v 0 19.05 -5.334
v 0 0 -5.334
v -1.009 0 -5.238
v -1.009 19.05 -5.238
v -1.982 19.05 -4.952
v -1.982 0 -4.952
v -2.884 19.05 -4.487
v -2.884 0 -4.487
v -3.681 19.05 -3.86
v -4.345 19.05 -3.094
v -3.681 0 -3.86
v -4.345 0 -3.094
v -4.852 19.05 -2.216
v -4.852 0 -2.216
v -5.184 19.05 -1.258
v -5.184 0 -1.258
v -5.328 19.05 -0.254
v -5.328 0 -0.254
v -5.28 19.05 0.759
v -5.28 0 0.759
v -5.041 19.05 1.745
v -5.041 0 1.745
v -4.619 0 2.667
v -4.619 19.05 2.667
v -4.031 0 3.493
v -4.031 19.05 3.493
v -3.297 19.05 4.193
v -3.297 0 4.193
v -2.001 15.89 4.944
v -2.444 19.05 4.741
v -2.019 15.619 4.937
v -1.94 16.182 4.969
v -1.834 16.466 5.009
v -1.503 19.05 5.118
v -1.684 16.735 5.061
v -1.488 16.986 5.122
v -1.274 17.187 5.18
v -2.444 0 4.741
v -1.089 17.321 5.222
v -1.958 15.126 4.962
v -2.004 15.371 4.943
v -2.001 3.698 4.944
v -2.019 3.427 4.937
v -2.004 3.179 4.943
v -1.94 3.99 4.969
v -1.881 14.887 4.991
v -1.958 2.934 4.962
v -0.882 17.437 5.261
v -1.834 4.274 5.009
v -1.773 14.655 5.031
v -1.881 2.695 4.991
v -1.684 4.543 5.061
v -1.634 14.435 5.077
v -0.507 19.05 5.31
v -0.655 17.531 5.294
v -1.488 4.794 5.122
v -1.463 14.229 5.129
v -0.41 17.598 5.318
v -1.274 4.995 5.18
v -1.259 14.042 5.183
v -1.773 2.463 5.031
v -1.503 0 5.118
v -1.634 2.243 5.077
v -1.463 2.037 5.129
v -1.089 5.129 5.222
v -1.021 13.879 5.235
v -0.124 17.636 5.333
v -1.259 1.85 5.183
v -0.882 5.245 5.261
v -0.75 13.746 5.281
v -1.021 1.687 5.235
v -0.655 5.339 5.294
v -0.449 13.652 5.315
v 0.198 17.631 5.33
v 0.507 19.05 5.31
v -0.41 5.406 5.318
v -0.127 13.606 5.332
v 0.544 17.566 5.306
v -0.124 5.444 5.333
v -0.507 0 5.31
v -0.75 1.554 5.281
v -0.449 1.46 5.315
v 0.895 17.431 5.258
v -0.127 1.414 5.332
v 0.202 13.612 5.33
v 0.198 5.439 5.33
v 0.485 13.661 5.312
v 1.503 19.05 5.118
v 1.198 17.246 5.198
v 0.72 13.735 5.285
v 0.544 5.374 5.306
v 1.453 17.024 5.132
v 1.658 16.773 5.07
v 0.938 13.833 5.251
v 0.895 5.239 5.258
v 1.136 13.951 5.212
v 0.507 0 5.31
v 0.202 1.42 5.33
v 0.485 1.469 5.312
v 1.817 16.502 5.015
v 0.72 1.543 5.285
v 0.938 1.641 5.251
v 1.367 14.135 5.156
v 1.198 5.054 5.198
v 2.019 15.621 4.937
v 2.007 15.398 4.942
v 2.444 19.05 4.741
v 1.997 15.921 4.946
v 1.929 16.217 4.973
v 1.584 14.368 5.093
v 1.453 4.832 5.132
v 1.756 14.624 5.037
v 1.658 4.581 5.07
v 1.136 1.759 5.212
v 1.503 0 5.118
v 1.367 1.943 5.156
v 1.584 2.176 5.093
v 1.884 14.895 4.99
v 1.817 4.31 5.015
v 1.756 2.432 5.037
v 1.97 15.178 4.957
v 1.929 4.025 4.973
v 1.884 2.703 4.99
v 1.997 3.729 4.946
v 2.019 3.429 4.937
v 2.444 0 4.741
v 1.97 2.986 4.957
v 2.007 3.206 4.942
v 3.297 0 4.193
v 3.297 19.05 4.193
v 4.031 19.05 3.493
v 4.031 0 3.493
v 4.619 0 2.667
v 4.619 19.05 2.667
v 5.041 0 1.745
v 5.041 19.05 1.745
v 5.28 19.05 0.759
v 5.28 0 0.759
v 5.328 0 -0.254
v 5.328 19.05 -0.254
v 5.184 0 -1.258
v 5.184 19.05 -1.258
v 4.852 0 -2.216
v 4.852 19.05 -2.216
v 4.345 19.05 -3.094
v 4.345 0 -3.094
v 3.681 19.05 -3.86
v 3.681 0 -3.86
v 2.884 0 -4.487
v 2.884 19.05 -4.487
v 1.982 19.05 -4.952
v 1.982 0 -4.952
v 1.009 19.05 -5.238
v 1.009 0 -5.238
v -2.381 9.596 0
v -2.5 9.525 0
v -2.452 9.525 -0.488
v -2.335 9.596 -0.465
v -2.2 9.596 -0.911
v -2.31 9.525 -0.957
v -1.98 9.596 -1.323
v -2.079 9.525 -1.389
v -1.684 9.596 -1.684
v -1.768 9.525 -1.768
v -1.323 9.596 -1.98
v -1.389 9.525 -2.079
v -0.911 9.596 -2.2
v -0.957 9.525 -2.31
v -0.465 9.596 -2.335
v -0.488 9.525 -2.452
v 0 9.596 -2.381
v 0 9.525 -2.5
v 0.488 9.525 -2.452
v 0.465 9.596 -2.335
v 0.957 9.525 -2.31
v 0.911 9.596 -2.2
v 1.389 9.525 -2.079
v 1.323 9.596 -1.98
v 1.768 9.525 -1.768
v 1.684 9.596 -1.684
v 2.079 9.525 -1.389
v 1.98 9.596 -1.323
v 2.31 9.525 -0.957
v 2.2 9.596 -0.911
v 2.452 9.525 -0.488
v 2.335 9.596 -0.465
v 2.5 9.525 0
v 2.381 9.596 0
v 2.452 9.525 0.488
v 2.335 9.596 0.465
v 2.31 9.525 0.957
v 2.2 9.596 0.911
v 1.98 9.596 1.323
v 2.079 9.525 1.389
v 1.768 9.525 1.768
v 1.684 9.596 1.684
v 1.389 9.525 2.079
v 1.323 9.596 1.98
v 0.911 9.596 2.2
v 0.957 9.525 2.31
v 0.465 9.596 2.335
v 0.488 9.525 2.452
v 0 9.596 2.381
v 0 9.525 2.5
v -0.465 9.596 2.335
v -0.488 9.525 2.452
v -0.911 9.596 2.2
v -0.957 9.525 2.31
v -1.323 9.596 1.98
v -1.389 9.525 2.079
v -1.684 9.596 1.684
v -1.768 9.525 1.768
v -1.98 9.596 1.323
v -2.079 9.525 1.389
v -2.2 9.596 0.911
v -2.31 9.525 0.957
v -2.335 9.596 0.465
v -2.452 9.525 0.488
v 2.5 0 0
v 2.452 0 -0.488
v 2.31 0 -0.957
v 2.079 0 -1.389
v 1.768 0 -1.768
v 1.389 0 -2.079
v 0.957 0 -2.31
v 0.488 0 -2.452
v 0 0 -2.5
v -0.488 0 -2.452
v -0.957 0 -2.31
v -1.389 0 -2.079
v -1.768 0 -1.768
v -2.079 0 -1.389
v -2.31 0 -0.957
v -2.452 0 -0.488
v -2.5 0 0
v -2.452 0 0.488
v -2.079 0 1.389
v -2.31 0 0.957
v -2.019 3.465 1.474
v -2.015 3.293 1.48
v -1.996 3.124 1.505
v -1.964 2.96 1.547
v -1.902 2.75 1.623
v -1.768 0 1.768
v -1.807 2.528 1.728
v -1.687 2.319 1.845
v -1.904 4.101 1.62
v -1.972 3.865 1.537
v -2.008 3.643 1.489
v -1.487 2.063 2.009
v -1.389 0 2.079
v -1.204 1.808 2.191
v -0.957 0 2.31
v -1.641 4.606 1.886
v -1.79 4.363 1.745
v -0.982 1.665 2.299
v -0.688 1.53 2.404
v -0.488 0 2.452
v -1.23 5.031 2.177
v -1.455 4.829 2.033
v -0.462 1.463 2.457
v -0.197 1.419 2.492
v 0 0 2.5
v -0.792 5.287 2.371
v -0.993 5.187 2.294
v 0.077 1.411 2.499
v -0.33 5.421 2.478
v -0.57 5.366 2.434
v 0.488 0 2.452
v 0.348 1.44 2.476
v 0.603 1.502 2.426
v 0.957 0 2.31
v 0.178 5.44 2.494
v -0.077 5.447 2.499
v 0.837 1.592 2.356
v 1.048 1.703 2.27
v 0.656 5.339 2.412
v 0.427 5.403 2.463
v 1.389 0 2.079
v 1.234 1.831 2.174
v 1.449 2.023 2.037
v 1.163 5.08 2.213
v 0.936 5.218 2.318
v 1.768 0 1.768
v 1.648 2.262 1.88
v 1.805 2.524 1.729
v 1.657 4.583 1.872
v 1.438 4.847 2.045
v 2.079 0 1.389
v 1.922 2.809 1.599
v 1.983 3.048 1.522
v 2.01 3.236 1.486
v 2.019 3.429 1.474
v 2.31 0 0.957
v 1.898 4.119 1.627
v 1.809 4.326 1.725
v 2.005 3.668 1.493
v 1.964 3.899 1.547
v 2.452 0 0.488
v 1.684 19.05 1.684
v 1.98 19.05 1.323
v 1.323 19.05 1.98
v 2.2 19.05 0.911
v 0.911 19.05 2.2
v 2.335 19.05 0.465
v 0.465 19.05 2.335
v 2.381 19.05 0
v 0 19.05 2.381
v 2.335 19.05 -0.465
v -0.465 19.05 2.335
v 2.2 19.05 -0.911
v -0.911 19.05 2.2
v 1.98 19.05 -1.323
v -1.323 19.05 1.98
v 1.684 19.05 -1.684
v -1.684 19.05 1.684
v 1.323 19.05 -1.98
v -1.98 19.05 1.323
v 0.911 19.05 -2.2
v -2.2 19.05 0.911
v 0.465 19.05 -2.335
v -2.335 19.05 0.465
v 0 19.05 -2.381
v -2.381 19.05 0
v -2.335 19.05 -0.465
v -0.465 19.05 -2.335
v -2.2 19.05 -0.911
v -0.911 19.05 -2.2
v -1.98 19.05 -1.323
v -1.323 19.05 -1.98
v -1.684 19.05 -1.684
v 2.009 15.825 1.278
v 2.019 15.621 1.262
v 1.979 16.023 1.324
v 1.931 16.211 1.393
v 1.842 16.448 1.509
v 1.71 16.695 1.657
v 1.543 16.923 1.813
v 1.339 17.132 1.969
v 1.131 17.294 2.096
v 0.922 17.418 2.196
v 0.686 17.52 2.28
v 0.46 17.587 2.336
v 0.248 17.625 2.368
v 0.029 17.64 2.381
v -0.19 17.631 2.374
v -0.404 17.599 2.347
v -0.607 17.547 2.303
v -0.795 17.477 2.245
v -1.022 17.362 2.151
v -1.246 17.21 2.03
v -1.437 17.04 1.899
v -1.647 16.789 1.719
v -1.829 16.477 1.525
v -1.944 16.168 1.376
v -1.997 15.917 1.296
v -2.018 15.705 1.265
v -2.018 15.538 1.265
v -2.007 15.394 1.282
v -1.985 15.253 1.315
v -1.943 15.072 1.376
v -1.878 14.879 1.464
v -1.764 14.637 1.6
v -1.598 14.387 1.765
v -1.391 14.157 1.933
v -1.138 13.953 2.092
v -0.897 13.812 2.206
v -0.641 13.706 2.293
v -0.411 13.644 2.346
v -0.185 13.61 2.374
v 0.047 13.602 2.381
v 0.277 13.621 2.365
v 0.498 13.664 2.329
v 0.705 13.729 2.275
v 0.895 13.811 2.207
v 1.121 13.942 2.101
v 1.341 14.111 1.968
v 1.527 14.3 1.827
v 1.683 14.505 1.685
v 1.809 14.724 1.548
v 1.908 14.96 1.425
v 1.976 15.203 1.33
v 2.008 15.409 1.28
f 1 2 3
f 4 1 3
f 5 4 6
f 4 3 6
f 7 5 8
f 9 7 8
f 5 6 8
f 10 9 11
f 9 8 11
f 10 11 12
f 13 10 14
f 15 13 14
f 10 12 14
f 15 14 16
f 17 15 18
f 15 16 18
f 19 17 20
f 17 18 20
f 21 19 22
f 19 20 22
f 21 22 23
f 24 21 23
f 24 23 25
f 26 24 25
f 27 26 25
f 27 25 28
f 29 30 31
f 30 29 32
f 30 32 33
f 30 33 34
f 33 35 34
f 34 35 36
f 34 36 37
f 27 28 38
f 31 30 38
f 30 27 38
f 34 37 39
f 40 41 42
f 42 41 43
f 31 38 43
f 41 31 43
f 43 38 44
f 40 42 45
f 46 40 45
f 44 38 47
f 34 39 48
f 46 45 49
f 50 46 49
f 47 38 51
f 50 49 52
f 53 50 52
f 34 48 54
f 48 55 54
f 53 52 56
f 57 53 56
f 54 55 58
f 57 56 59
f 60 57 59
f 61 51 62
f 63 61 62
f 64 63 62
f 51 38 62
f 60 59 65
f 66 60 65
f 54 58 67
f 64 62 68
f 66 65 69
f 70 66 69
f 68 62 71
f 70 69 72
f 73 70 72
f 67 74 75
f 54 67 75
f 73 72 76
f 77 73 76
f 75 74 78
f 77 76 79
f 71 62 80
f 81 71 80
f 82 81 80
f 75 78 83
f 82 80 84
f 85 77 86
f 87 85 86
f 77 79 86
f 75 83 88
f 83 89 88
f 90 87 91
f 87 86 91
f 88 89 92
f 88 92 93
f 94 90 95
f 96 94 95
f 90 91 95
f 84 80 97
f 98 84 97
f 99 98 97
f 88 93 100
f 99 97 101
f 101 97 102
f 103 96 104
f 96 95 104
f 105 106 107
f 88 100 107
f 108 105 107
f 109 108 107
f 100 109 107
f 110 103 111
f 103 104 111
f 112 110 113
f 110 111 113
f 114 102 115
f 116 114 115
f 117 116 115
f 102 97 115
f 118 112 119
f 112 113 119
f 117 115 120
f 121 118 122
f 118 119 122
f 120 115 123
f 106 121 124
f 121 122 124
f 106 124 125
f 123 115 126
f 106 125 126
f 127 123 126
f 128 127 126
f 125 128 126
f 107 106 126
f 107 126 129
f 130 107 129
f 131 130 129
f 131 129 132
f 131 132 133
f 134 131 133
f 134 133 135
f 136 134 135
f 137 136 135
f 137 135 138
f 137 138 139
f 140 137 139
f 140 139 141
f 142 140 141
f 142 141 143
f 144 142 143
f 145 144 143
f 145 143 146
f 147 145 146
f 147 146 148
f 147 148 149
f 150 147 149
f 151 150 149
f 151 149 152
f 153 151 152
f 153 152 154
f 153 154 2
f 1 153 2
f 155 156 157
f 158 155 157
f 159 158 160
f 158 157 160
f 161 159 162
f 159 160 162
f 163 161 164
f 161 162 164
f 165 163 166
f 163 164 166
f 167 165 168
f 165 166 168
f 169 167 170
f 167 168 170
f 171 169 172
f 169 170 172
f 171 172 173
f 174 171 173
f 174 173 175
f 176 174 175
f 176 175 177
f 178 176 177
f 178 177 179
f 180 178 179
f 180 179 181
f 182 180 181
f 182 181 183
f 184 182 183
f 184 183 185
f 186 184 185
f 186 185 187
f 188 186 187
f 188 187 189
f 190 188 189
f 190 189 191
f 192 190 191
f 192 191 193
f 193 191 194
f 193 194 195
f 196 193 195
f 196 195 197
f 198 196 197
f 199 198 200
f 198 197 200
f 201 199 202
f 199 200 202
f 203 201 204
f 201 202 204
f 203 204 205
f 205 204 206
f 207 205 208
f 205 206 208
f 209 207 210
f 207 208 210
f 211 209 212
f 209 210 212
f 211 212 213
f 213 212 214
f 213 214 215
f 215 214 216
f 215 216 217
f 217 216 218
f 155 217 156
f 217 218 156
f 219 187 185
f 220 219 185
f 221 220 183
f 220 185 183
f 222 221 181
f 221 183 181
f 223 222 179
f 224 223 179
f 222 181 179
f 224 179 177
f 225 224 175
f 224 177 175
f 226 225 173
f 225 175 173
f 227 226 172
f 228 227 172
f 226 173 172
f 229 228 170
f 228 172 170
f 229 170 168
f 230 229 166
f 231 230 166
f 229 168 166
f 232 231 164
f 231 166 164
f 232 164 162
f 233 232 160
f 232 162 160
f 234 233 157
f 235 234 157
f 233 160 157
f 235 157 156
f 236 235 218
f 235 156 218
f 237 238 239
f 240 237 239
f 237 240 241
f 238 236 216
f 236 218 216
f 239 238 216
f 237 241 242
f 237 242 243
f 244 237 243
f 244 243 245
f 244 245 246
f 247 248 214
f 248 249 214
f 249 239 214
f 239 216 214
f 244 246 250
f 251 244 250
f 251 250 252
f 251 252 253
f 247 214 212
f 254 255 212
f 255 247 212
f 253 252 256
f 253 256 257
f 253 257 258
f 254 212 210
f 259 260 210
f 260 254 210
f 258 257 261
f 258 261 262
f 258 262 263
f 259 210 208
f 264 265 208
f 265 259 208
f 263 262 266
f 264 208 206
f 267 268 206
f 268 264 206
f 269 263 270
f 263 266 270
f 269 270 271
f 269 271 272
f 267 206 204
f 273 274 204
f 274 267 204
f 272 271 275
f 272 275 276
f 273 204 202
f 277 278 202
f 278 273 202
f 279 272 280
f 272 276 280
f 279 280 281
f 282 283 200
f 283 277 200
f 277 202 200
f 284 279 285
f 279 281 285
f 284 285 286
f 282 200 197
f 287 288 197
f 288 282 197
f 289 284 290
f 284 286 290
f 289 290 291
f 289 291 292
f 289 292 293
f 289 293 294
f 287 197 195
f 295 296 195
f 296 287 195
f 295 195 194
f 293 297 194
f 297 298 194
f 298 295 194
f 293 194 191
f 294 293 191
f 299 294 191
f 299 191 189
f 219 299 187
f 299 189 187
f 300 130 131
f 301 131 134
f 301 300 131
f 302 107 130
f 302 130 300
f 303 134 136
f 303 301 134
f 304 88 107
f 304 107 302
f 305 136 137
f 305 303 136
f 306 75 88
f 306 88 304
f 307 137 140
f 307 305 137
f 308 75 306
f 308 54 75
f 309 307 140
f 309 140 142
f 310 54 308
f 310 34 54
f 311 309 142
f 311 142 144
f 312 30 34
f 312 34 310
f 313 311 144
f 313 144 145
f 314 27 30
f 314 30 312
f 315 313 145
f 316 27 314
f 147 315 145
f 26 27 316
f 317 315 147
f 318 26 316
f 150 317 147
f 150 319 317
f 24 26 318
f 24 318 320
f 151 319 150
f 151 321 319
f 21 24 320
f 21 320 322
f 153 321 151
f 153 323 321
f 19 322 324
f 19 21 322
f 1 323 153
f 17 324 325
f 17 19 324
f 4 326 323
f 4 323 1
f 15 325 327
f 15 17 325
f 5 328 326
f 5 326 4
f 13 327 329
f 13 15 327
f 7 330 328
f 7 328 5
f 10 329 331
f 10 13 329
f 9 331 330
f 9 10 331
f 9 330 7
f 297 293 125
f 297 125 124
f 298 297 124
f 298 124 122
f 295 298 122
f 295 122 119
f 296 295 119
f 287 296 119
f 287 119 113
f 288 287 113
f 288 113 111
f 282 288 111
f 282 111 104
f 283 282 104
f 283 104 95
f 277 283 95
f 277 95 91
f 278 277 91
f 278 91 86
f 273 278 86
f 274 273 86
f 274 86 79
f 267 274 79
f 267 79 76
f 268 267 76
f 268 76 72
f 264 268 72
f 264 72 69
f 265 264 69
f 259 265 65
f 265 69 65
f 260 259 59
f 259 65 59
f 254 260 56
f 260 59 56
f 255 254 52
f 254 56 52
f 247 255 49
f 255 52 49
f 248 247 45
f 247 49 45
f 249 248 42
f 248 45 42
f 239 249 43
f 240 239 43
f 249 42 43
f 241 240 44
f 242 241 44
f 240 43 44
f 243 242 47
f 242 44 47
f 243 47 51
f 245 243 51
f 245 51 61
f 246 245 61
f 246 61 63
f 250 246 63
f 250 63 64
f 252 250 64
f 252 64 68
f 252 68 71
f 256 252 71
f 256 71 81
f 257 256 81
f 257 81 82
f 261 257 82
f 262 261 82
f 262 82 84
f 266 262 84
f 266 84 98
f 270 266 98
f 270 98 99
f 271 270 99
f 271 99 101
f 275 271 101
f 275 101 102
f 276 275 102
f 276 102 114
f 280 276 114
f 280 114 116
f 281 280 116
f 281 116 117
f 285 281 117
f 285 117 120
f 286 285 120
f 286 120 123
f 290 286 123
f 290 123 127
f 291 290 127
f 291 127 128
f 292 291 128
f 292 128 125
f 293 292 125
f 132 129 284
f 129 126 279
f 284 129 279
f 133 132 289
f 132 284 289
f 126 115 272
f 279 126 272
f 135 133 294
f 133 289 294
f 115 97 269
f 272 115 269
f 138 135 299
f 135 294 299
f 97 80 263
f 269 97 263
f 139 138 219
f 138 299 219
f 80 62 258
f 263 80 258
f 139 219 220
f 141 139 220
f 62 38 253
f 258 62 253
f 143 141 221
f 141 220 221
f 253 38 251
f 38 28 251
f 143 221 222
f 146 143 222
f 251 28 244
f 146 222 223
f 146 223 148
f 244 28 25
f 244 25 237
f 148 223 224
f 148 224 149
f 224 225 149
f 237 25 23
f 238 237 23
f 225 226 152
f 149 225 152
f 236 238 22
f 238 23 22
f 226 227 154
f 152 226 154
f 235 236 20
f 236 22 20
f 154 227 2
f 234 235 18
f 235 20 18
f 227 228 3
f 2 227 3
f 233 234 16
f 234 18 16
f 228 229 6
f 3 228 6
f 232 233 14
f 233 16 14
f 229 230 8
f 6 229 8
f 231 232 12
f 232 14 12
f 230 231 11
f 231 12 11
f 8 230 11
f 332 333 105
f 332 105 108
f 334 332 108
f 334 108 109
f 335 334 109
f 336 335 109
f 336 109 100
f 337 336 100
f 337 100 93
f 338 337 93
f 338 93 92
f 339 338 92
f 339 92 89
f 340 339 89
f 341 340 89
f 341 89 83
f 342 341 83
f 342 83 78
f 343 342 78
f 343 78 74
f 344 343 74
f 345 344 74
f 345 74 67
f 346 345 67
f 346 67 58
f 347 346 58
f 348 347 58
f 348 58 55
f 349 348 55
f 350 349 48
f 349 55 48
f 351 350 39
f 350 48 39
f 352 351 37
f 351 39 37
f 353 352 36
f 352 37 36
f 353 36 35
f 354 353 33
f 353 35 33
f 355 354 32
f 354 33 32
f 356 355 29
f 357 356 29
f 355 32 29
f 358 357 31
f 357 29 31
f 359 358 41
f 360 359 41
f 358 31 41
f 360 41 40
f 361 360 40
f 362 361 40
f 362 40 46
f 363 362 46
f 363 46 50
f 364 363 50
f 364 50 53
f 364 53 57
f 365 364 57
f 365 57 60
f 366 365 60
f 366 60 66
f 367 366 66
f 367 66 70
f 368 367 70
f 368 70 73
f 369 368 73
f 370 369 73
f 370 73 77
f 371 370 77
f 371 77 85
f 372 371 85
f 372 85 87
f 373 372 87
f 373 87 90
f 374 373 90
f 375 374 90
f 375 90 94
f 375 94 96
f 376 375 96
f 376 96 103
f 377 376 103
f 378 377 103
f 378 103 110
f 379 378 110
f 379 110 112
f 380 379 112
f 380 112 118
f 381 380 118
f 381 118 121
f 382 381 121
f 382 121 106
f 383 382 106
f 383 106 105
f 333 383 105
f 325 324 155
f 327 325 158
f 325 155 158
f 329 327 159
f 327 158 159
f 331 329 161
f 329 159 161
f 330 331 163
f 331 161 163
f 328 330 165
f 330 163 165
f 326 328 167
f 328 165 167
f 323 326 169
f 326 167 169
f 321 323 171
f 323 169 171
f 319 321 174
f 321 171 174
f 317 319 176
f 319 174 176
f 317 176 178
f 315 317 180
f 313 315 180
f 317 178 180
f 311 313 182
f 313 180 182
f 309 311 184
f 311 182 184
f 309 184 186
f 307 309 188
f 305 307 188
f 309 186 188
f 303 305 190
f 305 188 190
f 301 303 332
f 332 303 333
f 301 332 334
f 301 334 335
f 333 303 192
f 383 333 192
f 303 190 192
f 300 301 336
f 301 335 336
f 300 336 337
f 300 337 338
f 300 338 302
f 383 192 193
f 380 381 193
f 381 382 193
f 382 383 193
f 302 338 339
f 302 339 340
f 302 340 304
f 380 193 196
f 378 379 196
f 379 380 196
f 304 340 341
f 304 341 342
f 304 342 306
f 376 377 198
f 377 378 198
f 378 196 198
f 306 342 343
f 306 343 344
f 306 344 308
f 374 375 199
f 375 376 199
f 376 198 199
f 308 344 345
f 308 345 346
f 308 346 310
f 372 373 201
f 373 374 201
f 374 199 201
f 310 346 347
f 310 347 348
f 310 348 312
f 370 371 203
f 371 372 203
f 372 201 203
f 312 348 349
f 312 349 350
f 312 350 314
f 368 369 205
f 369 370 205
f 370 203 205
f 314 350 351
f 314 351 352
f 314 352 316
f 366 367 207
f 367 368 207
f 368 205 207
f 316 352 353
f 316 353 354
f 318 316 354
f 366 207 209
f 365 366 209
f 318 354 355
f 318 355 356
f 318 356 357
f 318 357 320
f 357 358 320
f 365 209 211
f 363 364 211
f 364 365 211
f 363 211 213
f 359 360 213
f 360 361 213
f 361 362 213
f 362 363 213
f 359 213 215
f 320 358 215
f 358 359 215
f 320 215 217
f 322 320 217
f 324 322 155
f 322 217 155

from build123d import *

# Parameters (mm, degrees)
SKETCH1_R                       = 5.334
BOSS_EXTRUDE1_DEPTH             = 19.05
F_3_16_0_1875_DOWEL_HOLE2_D     = 4.7625
F_3_16_0_1875_DOWEL_HOLE2_DEPTH = 9.525
F_3_16_0_1875_DOWEL_HOLE2_TIP   = 1.430799349
F_5_0MM_DOWEL_HOLE2_D           = 5
F_5_0MM_DOWEL_HOLE2_DEPTH       = 9.525
F_5_0MM_DOWEL_HOLE2_TIP         = 1.502151548
F_10_32_TAPPED_HOLE1_REACH      = 26.836
F_10_32_TAPPED_HOLE1_BORE_R     = 2.0193


with BuildPart() as part:
    # Sketch1 → Boss-Extrude1 (new body)
    with BuildSketch(Plane(origin=(0, 0, 0), x_dir=(1, 0, 0), z_dir=(0, 1, 0))):
        with Locations(Location((0, 0, 0), (0, 0, 90))):
            Circle(SKETCH1_R)
    extrude(amount=BOSS_EXTRUDE1_DEPTH)

    # 3/16 (0.1875) Dowel Hole2
    with Locations(Plane(origin=(0, 19.05, 0), x_dir=(1, 0, 0), z_dir=(0, 1, 0))):
        with Locations((0, 0)):
            Hole(F_3_16_0_1875_DOWEL_HOLE2_D / 2, depth=F_3_16_0_1875_DOWEL_HOLE2_DEPTH)
            with Locations((0, 0, -(F_3_16_0_1875_DOWEL_HOLE2_DEPTH + F_3_16_0_1875_DOWEL_HOLE2_TIP / 2))):  # 118° drill point
                Cone(0, F_3_16_0_1875_DOWEL_HOLE2_D / 2, F_3_16_0_1875_DOWEL_HOLE2_TIP, mode=Mode.SUBTRACT)

    # Ø5.0mm Dowel Hole2
    with Locations(Plane(origin=(0, 0, 0), x_dir=(-1, 0, 0), z_dir=(0, -1, 0))):
        with Locations((0, 0)):
            Hole(F_5_0MM_DOWEL_HOLE2_D / 2, depth=F_5_0MM_DOWEL_HOLE2_DEPTH)
            with Locations((0, 0, -(F_5_0MM_DOWEL_HOLE2_DEPTH + F_5_0MM_DOWEL_HOLE2_TIP / 2))):  # 118° drill point
                Cone(0, F_5_0MM_DOWEL_HOLE2_D / 2, F_5_0MM_DOWEL_HOLE2_TIP, mode=Mode.SUBTRACT)

    # #10-32 Tapped Hole1 bore → #10-32 Tapped Hole1 (cut, up to next)
    with BuildSketch(Plane.XY.offset(9.681668378), mode=Mode.PRIVATE) as f_10_32_tapped_hole1_sk1:
        with Locations((0, 15.621)):
            Circle(F_10_32_TAPPED_HOLE1_BORE_R)
    f_10_32_tapped_hole1_tool1 = extrude(f_10_32_tapped_hole1_sk1.sketch, amount=-F_10_32_TAPPED_HOLE1_REACH, mode=Mode.PRIVATE) & part.part
    # #10-32 Tapped Hole1 bore → #10-32 Tapped Hole1 (cut, up to next)
    with BuildSketch(Plane.XY.offset(9.681668378), mode=Mode.PRIVATE) as f_10_32_tapped_hole1_sk2:
        with Locations((0, 3.429)):
            Circle(F_10_32_TAPPED_HOLE1_BORE_R)
    f_10_32_tapped_hole1_tool2 = extrude(f_10_32_tapped_hole1_sk2.sketch, amount=-F_10_32_TAPPED_HOLE1_REACH, mode=Mode.PRIVATE) & part.part
    add(f_10_32_tapped_hole1_tool1.solids().sort_by_distance((0, 15.621, 9.681668))[0], mode=Mode.SUBTRACT)
    add(f_10_32_tapped_hole1_tool2.solids().sort_by_distance((0, 3.429, 9.681668))[0], mode=Mode.SUBTRACT)


solid = part.part
